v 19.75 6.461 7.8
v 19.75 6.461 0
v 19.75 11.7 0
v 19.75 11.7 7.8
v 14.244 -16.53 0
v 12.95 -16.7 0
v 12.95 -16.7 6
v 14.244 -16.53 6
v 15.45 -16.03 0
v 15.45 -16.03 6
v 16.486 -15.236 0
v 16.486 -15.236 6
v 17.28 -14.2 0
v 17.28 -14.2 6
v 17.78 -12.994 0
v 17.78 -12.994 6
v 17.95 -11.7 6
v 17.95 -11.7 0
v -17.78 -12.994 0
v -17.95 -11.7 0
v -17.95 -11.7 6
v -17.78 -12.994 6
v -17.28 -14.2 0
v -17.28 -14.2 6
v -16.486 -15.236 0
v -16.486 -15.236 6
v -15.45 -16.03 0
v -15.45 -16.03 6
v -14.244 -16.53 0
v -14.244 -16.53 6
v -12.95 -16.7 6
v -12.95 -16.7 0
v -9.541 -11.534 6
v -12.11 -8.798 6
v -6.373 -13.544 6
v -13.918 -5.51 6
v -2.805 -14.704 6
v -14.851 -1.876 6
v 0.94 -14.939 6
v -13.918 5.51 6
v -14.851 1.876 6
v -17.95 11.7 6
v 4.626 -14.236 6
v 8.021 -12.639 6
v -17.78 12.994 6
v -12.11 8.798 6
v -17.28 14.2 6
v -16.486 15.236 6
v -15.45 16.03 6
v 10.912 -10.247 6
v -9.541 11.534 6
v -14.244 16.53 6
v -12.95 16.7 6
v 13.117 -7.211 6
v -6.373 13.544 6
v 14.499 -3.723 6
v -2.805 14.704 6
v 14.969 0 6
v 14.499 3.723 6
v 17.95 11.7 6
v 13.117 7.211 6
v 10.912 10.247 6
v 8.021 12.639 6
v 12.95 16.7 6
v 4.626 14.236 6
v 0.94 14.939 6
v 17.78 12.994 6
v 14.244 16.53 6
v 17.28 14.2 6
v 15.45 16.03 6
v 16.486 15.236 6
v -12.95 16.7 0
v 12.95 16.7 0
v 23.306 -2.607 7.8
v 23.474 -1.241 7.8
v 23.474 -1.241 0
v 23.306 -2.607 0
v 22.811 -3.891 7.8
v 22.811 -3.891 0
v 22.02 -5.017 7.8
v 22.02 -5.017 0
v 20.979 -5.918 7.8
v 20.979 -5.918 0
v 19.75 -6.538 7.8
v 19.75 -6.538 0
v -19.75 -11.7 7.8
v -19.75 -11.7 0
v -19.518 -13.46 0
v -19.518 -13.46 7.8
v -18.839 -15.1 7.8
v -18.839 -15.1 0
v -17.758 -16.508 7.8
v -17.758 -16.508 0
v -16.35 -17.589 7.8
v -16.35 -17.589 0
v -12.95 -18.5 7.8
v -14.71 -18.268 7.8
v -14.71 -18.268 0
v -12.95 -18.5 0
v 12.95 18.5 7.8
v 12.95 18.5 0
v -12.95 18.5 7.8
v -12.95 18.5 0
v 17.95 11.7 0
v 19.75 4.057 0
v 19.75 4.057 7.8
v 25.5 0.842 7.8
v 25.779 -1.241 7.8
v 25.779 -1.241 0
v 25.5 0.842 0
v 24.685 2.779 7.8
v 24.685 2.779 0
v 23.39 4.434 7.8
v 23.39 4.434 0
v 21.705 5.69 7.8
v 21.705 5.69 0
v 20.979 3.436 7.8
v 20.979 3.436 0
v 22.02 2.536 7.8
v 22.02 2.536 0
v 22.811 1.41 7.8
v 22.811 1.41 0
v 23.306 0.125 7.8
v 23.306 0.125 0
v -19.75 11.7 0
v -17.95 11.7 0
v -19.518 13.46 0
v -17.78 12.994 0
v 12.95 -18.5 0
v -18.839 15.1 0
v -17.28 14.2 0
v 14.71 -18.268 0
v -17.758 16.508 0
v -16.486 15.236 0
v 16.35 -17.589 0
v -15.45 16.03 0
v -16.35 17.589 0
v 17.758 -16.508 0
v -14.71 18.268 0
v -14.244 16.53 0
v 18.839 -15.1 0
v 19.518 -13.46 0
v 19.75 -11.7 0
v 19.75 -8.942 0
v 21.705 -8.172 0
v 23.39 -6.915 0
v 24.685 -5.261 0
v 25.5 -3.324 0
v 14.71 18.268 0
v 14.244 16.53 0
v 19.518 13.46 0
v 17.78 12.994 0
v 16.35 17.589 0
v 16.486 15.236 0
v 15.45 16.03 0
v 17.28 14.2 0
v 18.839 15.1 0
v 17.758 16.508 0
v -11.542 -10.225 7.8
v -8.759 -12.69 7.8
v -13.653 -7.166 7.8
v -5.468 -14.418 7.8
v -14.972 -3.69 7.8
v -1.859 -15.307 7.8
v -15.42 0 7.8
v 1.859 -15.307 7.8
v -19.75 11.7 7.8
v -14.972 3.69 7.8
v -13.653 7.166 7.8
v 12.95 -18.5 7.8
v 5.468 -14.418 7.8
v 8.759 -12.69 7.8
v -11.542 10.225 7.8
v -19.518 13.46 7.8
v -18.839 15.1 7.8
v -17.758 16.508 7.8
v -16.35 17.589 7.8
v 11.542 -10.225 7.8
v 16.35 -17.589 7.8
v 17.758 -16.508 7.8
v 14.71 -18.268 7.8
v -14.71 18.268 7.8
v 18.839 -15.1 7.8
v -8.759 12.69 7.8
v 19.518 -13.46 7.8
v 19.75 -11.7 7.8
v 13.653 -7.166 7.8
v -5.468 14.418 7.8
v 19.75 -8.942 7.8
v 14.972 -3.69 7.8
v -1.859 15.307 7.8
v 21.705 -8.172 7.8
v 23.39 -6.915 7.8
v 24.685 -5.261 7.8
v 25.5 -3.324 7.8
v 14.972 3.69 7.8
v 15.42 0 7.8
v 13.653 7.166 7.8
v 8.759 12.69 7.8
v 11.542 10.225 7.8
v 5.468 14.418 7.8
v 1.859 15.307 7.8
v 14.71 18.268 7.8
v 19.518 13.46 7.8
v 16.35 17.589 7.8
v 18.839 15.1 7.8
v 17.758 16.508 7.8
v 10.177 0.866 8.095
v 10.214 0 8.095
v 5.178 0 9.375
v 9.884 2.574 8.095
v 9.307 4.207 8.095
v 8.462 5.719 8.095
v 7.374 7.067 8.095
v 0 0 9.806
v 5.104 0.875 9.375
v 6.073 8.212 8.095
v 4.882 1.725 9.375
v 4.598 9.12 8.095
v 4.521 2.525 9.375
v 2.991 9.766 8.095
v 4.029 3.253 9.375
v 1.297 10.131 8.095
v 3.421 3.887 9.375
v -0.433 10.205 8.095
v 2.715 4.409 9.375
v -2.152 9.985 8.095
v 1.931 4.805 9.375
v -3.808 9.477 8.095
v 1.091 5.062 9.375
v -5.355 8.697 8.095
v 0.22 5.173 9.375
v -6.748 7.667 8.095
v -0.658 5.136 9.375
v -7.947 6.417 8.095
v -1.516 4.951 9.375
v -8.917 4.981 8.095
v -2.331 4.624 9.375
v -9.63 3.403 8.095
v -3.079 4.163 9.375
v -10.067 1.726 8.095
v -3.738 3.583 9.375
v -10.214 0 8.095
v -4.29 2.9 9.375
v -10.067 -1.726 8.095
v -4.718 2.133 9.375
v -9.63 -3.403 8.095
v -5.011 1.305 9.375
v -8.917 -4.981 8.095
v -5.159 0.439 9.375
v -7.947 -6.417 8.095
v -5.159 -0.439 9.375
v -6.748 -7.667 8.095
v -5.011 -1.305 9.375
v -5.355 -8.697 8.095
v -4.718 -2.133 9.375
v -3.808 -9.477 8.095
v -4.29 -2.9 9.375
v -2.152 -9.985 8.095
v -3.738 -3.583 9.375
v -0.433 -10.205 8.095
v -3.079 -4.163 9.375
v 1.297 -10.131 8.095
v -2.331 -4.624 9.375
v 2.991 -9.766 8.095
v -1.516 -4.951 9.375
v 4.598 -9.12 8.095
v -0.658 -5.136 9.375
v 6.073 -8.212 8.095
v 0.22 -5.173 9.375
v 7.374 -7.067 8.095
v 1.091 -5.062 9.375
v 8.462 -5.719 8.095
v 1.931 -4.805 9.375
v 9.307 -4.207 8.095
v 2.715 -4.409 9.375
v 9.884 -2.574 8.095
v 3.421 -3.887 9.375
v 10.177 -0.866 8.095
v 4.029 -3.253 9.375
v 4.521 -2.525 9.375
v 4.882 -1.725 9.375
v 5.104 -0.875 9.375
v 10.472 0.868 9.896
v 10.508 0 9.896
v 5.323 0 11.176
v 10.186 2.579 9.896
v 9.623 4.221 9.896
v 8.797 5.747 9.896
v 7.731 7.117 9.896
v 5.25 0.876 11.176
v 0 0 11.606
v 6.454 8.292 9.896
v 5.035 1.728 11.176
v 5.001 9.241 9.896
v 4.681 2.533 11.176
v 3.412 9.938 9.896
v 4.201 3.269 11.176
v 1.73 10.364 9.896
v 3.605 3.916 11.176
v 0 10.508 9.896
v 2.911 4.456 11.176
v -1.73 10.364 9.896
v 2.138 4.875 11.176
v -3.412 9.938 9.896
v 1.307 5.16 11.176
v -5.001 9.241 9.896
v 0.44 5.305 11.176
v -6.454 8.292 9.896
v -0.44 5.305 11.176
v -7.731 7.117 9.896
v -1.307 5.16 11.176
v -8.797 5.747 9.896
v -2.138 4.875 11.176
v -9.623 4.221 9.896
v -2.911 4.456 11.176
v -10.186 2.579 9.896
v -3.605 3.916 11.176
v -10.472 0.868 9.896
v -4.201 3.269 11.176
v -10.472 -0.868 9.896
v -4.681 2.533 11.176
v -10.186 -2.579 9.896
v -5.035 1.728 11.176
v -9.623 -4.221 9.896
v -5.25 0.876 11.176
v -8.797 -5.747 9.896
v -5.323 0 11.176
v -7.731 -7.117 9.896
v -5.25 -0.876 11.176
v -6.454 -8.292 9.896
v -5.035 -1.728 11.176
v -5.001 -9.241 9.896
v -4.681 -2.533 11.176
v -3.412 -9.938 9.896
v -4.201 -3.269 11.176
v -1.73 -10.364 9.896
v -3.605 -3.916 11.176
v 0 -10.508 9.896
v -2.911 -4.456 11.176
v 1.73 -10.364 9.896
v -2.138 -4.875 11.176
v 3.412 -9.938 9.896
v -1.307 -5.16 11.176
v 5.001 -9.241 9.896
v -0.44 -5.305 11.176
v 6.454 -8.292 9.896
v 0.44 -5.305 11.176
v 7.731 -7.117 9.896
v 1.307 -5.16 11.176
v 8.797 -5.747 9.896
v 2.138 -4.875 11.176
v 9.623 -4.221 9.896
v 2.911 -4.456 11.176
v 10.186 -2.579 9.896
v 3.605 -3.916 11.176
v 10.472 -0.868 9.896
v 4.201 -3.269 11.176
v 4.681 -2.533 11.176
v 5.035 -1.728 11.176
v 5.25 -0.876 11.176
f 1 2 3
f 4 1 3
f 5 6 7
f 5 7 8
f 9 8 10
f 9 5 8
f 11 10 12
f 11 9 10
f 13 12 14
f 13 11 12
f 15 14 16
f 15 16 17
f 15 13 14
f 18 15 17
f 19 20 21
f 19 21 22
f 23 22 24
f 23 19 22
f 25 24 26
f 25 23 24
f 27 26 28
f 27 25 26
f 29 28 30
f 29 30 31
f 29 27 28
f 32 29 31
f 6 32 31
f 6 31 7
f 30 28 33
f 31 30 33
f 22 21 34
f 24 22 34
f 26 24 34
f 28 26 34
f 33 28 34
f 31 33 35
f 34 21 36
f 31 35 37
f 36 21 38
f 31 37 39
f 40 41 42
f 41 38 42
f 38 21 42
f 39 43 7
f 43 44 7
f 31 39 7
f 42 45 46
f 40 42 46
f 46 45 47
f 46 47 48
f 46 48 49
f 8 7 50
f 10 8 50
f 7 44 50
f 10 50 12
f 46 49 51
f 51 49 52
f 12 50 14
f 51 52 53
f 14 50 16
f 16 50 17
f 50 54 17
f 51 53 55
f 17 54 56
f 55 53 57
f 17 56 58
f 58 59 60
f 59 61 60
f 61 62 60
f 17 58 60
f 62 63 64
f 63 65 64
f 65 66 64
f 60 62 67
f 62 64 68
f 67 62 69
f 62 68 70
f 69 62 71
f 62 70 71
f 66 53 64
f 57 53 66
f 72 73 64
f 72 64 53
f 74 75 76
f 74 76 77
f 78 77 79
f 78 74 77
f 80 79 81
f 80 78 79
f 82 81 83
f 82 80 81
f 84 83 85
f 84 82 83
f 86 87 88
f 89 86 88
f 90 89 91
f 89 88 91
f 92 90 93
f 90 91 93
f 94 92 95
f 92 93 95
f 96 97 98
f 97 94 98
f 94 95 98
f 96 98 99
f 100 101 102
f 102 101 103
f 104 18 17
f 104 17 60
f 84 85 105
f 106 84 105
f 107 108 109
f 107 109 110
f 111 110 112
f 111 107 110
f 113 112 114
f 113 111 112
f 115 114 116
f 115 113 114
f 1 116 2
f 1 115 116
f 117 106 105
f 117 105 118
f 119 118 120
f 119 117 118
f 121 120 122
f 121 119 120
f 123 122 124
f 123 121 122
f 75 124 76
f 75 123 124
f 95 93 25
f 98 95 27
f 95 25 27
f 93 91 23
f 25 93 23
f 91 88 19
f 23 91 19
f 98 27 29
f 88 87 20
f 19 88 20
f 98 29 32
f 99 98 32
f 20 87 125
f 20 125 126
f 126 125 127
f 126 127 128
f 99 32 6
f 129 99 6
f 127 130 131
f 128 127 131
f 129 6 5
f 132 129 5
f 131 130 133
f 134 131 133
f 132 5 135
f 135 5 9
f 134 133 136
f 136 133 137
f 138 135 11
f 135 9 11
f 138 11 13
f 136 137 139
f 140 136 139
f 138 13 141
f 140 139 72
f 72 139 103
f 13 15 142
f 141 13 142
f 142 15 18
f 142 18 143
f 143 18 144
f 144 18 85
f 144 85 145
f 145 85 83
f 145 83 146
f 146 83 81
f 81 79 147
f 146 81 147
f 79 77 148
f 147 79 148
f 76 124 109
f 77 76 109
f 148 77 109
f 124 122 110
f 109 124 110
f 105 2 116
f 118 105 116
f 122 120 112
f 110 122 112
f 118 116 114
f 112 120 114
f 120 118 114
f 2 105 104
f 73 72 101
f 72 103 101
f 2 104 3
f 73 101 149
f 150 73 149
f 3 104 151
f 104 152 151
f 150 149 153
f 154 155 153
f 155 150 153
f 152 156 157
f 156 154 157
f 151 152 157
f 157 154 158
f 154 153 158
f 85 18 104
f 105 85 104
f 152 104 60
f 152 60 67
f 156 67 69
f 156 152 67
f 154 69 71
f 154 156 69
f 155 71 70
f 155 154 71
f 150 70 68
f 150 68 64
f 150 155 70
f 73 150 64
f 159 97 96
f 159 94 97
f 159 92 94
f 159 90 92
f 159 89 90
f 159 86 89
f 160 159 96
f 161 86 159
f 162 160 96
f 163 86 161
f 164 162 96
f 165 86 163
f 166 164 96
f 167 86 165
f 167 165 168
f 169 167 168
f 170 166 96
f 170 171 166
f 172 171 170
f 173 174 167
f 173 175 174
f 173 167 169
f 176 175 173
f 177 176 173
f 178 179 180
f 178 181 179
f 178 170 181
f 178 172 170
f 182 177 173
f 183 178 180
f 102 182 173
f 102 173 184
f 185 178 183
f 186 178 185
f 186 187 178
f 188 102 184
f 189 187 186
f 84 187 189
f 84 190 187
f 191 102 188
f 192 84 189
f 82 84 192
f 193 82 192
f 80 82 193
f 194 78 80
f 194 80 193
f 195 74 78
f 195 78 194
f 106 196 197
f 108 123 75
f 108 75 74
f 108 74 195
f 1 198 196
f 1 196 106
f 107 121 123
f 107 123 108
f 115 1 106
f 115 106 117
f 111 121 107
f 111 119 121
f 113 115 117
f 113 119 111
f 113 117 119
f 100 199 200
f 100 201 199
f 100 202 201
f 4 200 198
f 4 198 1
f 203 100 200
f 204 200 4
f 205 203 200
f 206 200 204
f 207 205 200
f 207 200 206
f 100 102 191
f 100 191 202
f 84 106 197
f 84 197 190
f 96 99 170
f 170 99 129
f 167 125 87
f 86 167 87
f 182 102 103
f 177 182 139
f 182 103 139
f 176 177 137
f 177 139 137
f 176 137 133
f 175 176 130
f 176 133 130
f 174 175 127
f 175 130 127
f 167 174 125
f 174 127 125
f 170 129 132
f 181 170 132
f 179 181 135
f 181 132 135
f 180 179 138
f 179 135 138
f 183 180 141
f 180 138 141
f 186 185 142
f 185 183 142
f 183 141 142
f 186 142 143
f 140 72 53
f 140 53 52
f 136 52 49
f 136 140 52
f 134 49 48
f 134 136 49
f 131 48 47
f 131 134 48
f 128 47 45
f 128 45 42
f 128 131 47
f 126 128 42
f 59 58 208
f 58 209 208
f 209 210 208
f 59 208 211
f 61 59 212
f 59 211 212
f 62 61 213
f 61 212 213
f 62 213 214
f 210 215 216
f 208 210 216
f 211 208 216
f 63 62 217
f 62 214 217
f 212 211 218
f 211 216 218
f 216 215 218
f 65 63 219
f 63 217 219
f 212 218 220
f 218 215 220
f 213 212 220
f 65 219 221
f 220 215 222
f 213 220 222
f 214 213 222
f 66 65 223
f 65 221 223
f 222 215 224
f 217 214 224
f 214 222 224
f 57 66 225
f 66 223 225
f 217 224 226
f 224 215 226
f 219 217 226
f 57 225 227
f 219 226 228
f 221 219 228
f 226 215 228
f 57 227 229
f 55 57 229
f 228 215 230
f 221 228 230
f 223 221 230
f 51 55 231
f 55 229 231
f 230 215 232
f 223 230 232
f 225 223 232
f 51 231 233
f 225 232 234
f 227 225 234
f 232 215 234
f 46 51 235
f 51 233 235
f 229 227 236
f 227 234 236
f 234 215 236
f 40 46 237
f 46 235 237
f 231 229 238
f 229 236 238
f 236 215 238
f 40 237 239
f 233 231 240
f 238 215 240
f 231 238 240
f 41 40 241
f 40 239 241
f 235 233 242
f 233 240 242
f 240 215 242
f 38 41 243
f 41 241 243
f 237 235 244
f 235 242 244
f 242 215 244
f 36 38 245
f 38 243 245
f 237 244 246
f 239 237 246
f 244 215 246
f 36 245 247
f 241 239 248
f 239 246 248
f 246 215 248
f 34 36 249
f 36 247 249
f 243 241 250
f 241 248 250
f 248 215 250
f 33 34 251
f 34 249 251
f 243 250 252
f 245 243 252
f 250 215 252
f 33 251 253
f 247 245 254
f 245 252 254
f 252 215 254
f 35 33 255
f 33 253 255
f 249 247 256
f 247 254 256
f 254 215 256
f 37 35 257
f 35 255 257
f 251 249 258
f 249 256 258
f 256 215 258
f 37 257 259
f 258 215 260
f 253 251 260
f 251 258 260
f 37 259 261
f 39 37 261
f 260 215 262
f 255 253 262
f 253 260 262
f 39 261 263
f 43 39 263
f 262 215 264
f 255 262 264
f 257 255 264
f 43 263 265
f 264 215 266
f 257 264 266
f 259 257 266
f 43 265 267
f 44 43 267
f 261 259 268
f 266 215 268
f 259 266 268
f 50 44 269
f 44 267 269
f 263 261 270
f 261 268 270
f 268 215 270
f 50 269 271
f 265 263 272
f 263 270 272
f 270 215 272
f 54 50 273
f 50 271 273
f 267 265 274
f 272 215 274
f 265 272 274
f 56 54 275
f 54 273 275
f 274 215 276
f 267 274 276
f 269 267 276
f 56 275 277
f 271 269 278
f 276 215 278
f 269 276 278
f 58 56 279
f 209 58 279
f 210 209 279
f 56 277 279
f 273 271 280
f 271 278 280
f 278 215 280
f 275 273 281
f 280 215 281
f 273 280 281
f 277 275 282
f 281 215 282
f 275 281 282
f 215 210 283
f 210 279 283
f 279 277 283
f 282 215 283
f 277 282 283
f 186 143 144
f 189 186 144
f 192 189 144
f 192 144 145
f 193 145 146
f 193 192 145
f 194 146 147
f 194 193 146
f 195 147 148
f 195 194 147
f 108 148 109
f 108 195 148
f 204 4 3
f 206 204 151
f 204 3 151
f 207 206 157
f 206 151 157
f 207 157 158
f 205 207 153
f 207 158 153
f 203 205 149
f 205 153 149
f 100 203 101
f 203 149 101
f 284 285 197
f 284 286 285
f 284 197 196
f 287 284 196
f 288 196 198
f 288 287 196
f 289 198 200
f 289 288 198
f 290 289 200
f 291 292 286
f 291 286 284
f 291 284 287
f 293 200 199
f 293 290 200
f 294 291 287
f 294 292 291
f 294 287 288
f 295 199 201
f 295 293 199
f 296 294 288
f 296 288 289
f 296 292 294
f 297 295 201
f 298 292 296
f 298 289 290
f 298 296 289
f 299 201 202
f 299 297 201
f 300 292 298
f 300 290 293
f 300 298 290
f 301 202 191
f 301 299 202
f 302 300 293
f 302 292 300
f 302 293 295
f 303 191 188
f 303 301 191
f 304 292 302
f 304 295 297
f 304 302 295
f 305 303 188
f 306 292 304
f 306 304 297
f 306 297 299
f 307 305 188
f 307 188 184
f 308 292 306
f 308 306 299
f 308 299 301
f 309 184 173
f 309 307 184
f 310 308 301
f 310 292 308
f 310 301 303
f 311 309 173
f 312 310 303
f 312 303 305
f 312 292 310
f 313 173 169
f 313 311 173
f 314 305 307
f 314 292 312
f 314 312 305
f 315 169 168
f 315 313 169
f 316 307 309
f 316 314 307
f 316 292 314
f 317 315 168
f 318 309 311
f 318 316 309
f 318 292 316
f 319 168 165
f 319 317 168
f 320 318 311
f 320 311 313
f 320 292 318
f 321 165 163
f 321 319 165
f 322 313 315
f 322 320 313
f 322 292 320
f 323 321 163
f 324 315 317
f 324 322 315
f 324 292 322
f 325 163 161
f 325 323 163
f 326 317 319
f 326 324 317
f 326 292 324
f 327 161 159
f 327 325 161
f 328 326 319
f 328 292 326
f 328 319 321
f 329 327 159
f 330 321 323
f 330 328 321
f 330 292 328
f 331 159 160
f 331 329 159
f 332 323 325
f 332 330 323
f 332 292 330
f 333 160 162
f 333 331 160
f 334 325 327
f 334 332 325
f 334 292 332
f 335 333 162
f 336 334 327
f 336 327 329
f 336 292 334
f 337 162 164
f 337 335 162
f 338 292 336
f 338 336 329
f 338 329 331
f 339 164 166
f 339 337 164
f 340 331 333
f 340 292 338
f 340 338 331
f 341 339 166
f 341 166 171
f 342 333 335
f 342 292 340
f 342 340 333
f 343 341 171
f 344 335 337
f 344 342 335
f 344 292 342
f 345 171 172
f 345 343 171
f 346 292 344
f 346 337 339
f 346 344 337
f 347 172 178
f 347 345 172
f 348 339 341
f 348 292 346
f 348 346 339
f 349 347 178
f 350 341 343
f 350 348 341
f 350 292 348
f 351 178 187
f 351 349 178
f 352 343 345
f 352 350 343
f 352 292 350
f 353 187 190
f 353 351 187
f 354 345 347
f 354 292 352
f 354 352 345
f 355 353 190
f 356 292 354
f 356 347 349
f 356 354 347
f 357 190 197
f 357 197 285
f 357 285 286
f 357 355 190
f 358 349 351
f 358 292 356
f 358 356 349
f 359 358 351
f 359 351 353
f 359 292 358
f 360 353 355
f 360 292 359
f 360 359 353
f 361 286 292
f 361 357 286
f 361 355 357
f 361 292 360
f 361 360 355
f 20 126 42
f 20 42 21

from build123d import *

# Parameters (mm, degrees)
F1_DEPTH = 6
F4_T     = 1.8
F6_DEPTH = 7.8


with BuildPart() as f1:
    # F0 (on Top) → F1 (new body)
    with BuildSketch(Plane.XY):
        with BuildLine():
            Line((12.95, 16.7), (-12.95, 16.7))
            ThreePointArc((-12.95, 16.7), (-16.4855339059, 15.2355339059), (-17.95, 11.7))
            Line((-17.95, 11.7), (-17.95, -11.7))
            ThreePointArc((-17.95, -11.7), (-16.4855339059, -15.2355339059), (-12.95, -16.7))
            Line((-12.95, -16.7), (12.95, -16.7))
            ThreePointArc((12.95, -16.7), (16.4855339059, -15.2355339059), (17.95, -11.7))
            Line((17.95, -11.7), (17.95, 11.7))
            ThreePointArc((17.95, 11.7), (16.4855339059, 15.2355339059), (12.95, 16.7))
        make_face()
    extrude(amount=F1_DEPTH)

    # F2 (on Front) → F3 (revolve)
    with BuildSketch(Plane.XZ):
        with BuildLine():
            Line((0, 9.8057864234), (0, 6))
            Line((0, 6), (12.95, 6))
            Line((12.95, 6), (14.9687874717, 6))
            ThreePointArc((14.9687874717, 6), (7.7225094476, 8.8394416898), (0, 9.8057864234))
        make_face()
    revolve(axis=Axis((0, 0, 7.9028932117), (0, 0, 1)))

    # F4
    f4_openings = [f1.faces().sort_by_distance(p)[0] for p in [
        (0, 0, 0),
    ]]
    offset(amount=F4_T, openings=f4_openings, kind=Kind.INTERSECTION)

    # F5 (on face) → F6 (join, through all)
    with BuildSketch(Plane.XY.offset(7.8)):
        with BuildLine():
            ThreePointArc((19.75, 4.0565560225), (22.4501669969, 1.9970193201), (23.4744745018, -1.2407866307))
            ThreePointArc((23.4744745018, -1.2407866307), (22.4501669969, -4.4785925814), (19.75, -6.5381292838))
            Line((19.75, -6.5381292838), (19.75, -8.942287067))
            ThreePointArc((19.75, -8.942287067), (24.0922338374, -6.1310158755), (25.7786200161, -1.2407866307))
            ThreePointArc((25.7786200161, -1.2407866307), (24.0922338374, 3.6494426142), (19.75, 6.4607138057))
            Line((19.75, 6.4607138057), (19.75, 4.0565560225))
        make_face()
    extrude(amount=-F6_DEPTH)


solid = f1.part
